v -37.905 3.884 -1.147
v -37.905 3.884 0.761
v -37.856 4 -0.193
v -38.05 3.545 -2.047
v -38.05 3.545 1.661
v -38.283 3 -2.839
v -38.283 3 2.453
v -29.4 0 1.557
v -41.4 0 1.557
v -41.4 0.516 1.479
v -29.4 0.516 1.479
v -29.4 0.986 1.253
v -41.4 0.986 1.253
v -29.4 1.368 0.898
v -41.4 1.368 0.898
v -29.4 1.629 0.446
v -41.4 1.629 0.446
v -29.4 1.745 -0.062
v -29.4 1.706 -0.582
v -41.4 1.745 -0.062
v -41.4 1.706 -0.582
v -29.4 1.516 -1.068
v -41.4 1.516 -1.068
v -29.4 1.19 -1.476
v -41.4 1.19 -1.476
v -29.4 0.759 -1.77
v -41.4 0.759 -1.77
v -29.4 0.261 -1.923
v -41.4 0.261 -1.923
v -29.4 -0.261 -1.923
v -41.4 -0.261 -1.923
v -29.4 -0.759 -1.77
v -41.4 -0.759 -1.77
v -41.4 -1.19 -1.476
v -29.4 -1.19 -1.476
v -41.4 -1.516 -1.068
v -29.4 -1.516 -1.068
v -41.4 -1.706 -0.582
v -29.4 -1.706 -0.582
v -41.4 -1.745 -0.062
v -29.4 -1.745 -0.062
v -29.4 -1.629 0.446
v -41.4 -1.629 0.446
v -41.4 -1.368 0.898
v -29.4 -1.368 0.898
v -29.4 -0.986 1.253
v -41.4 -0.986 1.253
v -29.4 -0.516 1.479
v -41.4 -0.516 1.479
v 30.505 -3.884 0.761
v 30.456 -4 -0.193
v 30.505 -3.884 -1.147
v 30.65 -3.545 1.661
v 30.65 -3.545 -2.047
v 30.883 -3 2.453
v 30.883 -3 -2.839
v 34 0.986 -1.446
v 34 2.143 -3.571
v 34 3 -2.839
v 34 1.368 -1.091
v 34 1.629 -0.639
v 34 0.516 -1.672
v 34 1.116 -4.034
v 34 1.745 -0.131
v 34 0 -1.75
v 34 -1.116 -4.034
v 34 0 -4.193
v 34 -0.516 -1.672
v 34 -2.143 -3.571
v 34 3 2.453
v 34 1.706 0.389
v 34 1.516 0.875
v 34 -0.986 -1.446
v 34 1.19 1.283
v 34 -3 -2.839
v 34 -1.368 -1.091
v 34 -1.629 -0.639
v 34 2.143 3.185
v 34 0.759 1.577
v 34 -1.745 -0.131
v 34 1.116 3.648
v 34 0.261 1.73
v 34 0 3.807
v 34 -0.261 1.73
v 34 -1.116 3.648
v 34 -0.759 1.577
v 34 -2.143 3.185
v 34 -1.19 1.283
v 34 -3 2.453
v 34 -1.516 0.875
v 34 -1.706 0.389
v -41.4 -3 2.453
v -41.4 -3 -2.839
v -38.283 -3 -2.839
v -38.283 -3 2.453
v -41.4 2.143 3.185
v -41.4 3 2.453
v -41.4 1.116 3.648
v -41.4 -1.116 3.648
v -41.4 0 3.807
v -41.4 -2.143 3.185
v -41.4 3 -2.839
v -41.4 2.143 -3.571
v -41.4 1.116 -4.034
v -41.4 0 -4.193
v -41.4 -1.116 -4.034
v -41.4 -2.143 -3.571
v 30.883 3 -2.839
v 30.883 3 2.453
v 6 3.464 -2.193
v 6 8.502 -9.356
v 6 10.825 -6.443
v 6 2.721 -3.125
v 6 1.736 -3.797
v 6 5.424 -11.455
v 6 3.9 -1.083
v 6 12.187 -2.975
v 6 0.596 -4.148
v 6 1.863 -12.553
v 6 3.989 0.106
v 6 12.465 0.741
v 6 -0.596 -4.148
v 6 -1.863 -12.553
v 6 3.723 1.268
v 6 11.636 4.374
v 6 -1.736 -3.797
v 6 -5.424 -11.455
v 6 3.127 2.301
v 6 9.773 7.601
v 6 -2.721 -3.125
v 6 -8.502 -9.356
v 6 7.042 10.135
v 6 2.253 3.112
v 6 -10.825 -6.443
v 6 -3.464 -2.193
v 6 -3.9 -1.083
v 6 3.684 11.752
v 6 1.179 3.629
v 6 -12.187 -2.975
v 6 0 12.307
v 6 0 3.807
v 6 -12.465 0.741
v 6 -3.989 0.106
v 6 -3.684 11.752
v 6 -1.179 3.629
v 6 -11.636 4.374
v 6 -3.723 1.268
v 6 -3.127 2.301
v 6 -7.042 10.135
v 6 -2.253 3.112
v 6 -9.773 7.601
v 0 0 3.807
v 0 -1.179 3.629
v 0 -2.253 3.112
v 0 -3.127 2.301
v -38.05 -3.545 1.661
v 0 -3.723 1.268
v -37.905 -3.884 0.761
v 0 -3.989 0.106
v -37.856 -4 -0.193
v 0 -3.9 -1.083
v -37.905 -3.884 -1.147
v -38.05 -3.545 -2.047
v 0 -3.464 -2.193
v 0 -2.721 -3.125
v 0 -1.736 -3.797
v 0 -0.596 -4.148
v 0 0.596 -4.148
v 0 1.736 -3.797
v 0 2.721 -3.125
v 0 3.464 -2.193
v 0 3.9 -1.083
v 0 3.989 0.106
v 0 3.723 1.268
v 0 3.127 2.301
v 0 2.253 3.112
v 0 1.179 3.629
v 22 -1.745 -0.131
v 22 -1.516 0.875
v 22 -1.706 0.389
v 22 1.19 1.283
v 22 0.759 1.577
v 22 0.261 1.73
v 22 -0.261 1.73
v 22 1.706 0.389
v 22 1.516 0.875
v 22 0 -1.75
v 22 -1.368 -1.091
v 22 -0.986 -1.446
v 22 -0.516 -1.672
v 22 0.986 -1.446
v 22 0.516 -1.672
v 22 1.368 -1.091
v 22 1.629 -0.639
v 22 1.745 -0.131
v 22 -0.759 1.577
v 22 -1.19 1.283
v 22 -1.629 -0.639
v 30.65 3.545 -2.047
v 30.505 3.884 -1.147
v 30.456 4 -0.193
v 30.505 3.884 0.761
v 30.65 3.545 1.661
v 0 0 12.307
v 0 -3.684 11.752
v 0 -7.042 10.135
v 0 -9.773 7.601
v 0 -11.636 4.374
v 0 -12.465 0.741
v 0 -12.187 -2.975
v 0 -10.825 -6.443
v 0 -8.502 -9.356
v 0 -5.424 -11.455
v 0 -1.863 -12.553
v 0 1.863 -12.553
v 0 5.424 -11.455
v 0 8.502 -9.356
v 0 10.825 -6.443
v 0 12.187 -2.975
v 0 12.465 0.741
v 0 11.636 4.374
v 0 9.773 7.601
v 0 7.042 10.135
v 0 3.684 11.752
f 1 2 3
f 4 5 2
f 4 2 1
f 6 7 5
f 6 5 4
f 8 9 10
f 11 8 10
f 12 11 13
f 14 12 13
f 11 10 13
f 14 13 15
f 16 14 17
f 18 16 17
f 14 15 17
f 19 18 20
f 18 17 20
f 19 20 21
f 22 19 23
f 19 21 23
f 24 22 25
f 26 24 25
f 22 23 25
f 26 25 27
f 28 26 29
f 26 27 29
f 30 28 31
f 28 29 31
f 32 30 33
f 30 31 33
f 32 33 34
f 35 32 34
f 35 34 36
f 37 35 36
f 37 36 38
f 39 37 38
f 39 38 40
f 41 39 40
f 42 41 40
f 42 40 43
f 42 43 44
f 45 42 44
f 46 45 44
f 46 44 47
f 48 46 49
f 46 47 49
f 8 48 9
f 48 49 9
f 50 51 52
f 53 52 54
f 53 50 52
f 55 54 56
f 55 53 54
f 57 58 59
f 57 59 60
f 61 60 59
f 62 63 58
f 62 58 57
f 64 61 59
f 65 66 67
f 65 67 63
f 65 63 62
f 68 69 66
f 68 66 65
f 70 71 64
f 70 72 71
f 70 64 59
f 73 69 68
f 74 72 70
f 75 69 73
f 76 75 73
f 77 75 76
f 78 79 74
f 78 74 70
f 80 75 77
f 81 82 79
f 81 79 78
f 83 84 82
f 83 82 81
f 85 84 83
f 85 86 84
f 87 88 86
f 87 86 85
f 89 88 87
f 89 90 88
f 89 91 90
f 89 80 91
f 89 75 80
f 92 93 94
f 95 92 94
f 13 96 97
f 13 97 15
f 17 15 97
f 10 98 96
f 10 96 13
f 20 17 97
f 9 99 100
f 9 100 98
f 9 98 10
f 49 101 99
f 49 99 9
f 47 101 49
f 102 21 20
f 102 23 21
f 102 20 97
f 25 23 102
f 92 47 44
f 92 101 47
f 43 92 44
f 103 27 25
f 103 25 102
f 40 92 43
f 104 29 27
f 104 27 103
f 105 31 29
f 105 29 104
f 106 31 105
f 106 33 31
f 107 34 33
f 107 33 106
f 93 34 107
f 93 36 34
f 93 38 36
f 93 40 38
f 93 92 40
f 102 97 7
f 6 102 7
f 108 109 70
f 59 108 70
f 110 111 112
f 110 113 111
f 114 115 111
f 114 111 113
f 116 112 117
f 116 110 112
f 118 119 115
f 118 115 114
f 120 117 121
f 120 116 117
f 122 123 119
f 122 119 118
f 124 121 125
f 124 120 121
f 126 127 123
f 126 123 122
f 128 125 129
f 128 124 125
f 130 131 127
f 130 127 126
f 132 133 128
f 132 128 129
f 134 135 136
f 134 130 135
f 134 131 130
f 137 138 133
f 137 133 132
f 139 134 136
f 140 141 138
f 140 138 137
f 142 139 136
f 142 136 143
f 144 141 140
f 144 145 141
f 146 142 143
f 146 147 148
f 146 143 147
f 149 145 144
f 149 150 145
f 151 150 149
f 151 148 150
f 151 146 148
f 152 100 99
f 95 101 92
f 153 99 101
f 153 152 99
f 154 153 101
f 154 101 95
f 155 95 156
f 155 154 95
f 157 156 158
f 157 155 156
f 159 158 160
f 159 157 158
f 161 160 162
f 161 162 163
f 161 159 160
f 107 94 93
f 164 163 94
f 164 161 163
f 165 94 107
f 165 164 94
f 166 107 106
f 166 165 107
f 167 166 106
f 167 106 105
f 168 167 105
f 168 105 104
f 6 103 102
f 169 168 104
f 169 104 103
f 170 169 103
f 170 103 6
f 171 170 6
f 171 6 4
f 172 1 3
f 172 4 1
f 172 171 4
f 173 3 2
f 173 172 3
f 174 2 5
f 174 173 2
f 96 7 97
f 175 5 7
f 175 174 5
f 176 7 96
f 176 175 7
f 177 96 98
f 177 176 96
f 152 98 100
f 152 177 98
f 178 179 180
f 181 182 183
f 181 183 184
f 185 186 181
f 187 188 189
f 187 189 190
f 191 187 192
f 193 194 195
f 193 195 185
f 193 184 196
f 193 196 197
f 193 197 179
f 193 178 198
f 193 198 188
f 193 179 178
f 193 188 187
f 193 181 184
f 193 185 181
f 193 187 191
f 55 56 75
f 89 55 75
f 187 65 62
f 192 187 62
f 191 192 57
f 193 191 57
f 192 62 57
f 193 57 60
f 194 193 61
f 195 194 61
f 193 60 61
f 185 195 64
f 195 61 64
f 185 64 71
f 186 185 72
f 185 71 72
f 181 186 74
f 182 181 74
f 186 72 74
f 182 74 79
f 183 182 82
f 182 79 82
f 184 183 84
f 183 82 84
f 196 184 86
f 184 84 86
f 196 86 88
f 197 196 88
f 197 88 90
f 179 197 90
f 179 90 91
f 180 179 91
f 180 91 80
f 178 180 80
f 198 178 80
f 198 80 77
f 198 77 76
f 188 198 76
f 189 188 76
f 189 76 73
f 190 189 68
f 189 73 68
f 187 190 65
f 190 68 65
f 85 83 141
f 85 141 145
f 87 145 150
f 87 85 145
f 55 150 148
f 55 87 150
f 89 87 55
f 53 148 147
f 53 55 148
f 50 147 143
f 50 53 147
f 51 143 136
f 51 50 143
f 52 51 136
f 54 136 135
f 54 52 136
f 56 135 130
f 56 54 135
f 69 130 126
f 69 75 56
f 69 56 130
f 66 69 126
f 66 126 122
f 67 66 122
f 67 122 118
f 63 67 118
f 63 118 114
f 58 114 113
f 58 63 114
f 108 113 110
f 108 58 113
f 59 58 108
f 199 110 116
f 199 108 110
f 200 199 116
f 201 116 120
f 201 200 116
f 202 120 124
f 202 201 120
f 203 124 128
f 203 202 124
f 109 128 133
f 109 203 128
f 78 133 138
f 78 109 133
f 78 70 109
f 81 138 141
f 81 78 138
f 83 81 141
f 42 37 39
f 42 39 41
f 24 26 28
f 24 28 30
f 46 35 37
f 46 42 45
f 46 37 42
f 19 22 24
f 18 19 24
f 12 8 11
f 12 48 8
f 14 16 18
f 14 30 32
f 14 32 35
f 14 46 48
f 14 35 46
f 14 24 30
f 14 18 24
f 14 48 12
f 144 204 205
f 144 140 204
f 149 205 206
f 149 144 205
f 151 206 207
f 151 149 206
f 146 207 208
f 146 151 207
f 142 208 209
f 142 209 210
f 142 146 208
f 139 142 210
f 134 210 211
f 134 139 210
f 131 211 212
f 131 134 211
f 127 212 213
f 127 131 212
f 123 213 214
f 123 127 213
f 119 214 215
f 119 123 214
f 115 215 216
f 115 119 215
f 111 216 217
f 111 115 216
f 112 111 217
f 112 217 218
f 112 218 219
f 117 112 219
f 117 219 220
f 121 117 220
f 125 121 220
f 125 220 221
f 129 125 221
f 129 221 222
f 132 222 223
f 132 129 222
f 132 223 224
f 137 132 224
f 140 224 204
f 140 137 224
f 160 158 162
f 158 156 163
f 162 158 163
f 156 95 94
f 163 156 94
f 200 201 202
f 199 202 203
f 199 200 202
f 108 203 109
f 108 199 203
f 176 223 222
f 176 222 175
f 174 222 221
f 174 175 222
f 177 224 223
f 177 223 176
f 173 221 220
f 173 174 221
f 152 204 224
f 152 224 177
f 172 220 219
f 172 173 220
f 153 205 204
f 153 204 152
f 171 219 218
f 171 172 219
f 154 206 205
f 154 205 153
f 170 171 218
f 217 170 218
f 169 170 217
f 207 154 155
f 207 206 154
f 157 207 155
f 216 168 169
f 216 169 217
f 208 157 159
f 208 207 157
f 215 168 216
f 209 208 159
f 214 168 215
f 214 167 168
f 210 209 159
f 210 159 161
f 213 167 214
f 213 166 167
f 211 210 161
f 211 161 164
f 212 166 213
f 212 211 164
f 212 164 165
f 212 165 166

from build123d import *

# Parameters (mm, degrees)
SKETCH_2_R          = 1.75
CUT_EXTRUDE_1_DEPTH = 12
SKETCH_3_R          = 1.75
CUT_EXTRUDE_2_DEPTH = 12
CUT_EXTRUDE_5_DEPTH = 6


with BuildPart() as part:
    # 草图1 → 旋转1 (revolve)
    with BuildSketch(Plane(origin=(0, 0, 0), x_dir=(1, 0, 0), z_dir=(0, 1, 0)), mode=Mode.PRIVATE) as revolve_1_sk:
        Polygon((-41.4, 0.193025833), (-41.4, 4.193025833), (0, 4.193025833), (0, 12.693025833), (6, 12.693025833), (6, 4.193025833), (34, 4.193025833), (34, 0.193025833), align=None)
    revolve(revolve_1_sk.sketch.rotate(Axis((-41.4, 0, -0.193025833), (1, 0, 0)), 180), axis=Axis((-41.4, 0, -0.193025833), (1, 0, 0)))

    # 草图2 → 拉伸1 (cut)
    with BuildSketch(Plane(origin=(34, 0, 0), x_dir=(0, 0, -1), z_dir=(1, 0, 0))):
        Circle(SKETCH_2_R)
    extrude(amount=-CUT_EXTRUDE_1_DEPTH, mode=Mode.SUBTRACT)

    # 草图3 → 拉伸2 (cut)
    with BuildSketch(Plane.ZY.offset(41.4)):
        with Locations((-0.193025833, 0)):
            Circle(SKETCH_3_R)
    extrude(amount=-CUT_EXTRUDE_2_DEPTH, mode=Mode.SUBTRACT)

    # 草图4 → 拉伸5 (cut, symmetric)
    with BuildSketch(Plane.XY):
        Polygon((-41.4, 4), (-41.4, 3), (-38.2827279, 3), (-37.855795833, 4), align=None)
        Polygon((34, 4), (30.455795833, 4), (30.8827279, 3), (34, 3), align=None)
        Polygon((-41.4, -4), (-41.4, -3), (-38.2827279, -3), (-37.855795833, -4), align=None)
        Polygon((30.8827279, -3), (34, -3), (34, -4), (30.455795833, -4), align=None)
    extrude(amount=CUT_EXTRUDE_5_DEPTH, both=True, mode=Mode.SUBTRACT)


solid = part.part
